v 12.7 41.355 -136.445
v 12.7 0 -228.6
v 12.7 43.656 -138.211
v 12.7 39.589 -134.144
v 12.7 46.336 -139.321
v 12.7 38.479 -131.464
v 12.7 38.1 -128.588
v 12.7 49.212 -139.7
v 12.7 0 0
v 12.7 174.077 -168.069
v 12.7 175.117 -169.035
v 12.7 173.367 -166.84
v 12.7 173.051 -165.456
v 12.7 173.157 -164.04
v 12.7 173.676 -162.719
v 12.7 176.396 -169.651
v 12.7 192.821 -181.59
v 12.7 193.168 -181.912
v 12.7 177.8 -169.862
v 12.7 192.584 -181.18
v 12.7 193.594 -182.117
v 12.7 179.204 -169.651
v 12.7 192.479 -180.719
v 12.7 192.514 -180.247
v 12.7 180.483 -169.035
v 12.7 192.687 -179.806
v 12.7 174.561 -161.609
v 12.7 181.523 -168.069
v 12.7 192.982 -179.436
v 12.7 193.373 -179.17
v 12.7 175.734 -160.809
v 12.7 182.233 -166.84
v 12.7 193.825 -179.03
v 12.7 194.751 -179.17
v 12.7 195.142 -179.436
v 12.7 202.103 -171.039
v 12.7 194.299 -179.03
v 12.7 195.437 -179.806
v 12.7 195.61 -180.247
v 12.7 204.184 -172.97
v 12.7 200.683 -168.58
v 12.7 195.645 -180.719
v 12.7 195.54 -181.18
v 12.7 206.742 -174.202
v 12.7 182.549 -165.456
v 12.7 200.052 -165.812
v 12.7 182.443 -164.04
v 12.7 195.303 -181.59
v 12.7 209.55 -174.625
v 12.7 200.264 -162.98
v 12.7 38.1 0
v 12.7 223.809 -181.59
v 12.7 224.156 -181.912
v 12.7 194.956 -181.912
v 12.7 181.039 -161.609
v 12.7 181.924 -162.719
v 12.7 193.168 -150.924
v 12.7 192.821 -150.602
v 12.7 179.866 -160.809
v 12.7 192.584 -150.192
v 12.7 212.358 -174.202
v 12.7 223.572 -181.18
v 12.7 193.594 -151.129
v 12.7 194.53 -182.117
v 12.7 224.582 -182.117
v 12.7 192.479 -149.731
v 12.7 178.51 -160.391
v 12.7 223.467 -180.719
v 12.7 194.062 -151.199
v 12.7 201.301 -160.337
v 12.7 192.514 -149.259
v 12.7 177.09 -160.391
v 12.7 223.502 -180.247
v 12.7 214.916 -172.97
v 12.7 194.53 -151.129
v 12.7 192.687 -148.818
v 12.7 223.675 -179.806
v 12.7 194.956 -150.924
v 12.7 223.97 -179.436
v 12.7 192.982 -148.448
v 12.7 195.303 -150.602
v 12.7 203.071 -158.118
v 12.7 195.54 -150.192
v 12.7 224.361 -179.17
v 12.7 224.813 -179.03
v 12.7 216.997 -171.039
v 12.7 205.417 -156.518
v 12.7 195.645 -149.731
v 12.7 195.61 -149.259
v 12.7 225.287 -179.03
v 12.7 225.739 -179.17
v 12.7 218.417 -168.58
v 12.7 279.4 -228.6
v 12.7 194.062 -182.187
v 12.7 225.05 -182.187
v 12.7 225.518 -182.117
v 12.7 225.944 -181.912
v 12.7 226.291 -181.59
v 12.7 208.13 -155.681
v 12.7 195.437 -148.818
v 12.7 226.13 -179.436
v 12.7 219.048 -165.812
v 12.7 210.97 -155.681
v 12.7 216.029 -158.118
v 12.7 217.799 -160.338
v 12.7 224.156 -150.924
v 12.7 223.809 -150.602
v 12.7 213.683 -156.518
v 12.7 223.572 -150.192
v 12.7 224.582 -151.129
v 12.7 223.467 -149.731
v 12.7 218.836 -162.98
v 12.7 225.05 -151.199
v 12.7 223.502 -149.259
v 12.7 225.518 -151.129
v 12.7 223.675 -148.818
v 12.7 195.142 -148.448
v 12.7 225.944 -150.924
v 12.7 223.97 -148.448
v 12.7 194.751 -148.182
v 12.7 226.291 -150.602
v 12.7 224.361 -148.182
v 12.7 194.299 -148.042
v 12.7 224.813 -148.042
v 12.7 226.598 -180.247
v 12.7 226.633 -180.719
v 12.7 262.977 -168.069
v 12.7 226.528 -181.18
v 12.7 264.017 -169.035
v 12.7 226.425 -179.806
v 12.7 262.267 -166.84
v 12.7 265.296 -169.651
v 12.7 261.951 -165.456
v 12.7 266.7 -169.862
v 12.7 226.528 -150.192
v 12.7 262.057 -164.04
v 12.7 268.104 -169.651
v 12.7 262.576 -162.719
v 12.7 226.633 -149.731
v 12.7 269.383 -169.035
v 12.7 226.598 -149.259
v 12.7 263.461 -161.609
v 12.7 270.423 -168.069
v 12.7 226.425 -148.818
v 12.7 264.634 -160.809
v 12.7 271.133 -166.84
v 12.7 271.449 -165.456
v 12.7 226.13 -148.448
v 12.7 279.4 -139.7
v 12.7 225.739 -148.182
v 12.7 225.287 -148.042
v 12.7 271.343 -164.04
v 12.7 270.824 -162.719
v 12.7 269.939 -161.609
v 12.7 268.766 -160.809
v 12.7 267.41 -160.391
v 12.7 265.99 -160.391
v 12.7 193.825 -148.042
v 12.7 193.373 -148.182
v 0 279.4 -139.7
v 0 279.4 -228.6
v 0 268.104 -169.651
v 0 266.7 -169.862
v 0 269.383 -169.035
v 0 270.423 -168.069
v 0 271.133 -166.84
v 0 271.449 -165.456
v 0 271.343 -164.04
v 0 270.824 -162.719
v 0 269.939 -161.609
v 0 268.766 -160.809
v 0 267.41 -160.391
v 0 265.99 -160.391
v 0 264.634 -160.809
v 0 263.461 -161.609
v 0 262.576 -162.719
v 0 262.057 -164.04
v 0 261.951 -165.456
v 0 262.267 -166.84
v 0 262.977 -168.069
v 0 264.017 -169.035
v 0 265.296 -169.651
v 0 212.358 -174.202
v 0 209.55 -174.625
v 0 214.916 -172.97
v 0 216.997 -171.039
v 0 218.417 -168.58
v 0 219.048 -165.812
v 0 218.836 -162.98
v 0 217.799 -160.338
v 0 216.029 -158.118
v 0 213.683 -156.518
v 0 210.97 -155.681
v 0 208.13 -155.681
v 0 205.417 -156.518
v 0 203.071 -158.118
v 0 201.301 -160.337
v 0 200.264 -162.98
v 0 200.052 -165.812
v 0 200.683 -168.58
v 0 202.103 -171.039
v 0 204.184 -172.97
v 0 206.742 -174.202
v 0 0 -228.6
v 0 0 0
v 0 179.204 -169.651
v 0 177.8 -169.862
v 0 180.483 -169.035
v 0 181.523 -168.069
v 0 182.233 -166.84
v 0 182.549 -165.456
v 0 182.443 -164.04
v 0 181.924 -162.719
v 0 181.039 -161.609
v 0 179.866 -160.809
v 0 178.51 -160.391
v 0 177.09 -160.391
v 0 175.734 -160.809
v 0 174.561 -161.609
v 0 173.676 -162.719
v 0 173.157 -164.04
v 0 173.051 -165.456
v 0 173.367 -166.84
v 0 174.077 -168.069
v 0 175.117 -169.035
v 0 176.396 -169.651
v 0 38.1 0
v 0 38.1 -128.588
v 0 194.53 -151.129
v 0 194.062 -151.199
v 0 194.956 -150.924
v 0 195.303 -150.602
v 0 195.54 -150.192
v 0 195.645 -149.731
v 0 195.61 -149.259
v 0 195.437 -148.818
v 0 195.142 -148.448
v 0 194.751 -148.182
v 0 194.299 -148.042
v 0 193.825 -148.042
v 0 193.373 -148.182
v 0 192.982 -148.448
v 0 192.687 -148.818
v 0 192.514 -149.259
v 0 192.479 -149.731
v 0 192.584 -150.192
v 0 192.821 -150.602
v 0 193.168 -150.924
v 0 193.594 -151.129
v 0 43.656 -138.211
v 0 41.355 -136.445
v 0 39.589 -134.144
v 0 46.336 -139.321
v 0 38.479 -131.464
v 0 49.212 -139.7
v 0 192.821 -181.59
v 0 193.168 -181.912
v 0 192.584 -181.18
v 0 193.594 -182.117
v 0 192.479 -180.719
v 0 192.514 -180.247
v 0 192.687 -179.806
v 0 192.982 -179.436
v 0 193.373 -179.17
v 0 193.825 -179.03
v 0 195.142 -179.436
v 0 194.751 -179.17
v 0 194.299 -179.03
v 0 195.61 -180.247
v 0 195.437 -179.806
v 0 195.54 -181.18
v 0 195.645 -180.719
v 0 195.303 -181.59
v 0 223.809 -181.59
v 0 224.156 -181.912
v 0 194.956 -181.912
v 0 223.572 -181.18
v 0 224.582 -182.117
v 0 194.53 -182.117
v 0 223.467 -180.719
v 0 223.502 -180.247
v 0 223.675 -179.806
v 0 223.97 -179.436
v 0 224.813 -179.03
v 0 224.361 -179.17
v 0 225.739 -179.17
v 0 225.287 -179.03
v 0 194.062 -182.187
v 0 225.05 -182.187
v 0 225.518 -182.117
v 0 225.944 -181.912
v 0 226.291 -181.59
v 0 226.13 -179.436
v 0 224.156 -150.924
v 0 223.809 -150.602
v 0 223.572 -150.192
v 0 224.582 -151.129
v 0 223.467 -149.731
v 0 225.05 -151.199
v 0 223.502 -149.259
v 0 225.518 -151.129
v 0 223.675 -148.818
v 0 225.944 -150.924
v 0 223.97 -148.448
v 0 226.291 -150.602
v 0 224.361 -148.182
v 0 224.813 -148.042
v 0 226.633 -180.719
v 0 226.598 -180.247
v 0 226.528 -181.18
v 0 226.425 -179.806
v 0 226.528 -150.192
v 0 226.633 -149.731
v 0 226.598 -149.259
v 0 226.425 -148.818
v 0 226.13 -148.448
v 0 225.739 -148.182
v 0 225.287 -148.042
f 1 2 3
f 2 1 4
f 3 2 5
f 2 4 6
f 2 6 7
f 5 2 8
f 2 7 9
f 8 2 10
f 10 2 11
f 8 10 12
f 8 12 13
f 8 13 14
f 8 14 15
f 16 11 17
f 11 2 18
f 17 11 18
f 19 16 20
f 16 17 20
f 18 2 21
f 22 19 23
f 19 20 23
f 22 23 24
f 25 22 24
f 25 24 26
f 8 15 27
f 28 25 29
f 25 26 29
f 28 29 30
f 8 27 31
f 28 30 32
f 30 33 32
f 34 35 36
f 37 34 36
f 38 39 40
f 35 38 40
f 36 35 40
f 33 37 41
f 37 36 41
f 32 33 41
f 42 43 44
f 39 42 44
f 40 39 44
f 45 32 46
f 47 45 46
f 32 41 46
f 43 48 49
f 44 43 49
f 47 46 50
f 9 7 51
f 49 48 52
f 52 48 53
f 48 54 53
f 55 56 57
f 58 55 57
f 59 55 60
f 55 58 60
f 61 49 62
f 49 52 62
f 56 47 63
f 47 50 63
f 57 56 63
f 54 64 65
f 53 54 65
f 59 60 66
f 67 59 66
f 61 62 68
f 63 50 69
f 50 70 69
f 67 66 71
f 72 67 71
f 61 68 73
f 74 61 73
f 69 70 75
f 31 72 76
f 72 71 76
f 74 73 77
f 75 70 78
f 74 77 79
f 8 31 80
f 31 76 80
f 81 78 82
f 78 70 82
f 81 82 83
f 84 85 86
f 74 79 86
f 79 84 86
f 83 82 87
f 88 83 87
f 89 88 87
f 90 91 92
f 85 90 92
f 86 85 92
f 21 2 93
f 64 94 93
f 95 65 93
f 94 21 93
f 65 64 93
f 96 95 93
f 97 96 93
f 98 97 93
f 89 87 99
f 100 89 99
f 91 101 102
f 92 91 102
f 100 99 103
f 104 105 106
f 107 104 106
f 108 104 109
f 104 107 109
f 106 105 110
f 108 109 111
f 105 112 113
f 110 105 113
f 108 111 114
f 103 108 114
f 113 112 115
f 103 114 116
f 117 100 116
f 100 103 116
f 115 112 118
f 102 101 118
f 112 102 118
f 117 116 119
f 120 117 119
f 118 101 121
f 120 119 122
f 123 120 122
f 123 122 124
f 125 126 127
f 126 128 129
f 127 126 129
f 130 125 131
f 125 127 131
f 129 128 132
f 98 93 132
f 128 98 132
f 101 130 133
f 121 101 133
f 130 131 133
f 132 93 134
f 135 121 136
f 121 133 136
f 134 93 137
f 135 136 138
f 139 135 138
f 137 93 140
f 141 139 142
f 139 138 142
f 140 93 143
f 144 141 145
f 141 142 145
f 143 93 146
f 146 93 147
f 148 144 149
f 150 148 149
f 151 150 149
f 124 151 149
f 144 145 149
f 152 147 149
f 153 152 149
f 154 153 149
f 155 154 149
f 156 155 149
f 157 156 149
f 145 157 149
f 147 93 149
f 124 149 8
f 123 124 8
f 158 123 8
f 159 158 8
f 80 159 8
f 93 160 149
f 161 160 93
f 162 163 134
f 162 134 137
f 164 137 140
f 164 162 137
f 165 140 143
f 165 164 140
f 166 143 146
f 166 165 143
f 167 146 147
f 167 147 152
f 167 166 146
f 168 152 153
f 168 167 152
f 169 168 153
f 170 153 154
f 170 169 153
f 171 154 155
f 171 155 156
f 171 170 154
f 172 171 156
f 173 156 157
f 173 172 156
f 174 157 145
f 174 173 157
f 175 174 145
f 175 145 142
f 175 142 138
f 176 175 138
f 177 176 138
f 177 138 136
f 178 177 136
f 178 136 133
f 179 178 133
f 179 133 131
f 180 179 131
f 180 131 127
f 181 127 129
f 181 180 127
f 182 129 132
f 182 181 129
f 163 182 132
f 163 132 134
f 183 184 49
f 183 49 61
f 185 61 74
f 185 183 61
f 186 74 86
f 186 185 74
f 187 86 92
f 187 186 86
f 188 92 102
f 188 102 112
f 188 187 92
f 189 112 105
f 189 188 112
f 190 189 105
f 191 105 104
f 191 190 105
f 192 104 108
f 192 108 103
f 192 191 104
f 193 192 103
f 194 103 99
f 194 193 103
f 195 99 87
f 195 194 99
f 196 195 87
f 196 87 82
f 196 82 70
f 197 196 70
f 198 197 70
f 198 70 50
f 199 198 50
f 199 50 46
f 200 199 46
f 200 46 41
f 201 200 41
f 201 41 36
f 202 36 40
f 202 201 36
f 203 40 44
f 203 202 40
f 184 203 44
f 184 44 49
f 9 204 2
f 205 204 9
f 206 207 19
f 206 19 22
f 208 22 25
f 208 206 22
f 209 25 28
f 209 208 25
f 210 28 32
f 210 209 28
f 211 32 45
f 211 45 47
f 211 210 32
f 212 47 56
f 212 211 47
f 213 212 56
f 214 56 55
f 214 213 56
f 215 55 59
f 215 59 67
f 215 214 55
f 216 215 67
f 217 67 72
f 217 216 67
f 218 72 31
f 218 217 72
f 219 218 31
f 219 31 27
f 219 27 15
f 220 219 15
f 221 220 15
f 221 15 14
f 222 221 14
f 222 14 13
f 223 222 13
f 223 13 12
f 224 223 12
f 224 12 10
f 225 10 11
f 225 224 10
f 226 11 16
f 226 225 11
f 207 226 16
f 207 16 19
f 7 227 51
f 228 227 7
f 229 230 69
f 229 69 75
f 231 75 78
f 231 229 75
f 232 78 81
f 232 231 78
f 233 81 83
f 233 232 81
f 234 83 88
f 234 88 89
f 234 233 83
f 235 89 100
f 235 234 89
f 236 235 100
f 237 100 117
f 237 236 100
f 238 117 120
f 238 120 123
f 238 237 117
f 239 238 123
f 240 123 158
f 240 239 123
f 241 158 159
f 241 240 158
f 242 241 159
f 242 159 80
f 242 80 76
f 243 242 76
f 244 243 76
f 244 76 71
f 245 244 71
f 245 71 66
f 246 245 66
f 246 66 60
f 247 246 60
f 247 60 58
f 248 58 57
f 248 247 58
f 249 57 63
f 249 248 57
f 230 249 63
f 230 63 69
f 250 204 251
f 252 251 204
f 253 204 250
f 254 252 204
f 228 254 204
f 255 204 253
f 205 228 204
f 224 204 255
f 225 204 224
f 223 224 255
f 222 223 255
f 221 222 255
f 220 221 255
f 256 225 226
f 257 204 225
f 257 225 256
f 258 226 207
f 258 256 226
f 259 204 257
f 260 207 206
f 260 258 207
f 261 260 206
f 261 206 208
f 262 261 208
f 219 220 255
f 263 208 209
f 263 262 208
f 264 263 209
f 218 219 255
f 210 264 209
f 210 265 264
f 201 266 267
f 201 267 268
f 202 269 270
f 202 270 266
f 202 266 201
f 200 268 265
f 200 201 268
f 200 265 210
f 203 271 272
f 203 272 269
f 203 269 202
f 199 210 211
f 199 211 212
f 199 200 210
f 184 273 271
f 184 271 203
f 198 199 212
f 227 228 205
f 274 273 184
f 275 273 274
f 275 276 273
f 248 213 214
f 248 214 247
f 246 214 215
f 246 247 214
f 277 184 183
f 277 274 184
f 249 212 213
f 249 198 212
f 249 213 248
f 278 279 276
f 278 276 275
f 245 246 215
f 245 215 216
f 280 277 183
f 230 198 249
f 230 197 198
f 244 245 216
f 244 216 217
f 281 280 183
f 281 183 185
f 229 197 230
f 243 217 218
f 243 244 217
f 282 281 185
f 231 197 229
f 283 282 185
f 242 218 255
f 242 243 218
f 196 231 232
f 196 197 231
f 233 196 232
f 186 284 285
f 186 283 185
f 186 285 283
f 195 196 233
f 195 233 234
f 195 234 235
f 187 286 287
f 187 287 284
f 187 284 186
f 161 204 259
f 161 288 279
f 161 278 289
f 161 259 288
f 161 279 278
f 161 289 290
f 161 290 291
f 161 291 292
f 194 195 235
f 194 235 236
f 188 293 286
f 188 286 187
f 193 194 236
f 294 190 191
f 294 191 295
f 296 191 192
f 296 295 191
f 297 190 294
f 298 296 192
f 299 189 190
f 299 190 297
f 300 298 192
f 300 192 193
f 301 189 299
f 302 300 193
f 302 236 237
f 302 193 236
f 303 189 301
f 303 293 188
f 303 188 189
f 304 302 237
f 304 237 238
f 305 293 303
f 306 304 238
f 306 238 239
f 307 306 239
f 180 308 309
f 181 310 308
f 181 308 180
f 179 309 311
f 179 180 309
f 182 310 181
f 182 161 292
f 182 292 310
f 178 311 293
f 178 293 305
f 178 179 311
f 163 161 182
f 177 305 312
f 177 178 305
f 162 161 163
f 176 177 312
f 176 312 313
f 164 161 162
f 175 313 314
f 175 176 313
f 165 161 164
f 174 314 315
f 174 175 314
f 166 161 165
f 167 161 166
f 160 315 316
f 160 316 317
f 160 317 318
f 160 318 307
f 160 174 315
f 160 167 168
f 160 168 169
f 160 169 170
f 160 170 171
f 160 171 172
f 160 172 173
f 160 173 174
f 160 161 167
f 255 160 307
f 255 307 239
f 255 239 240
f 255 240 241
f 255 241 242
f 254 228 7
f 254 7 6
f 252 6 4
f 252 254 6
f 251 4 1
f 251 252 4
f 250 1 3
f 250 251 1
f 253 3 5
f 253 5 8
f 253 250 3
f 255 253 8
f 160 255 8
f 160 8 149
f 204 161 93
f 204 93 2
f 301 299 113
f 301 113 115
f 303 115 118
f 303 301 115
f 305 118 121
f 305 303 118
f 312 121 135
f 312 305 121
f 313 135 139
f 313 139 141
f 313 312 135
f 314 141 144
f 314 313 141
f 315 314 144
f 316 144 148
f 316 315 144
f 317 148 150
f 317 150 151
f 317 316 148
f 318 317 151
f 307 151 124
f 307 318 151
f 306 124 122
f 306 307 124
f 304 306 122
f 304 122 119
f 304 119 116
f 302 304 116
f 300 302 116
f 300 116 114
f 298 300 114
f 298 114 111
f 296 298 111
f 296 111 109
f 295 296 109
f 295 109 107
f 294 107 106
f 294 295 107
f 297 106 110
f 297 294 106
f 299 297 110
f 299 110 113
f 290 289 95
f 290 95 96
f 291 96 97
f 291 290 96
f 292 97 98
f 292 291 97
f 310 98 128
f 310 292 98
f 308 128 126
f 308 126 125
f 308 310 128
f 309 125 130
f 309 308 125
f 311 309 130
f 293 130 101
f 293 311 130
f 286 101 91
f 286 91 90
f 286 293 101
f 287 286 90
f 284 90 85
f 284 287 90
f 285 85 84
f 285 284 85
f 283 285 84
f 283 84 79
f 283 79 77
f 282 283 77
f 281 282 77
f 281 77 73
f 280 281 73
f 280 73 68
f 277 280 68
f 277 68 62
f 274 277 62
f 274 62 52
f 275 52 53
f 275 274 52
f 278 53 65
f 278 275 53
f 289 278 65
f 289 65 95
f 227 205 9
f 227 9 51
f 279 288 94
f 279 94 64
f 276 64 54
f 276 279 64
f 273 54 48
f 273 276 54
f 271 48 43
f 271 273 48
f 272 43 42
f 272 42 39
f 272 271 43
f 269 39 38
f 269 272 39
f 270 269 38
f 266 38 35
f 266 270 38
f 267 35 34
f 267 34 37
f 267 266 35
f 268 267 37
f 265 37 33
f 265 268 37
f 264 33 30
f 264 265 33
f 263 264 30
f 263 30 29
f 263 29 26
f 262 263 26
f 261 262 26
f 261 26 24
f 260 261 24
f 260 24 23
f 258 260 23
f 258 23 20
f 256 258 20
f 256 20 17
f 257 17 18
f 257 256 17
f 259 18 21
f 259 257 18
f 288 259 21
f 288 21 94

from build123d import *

# Parameters (mm, degrees)
SKETCH1_R           = 4.7625
SKETCH1_R_2         = 9.525
SKETCH1_R_3         = 1.5875
BOSS_EXTRUDE1_DEPTH = 12.7


with BuildPart() as part:
    # Sketch1 → Boss-Extrude1 (new body)
    with BuildSketch(Plane(origin=(0, 0, 0), x_dir=(0, 0, -1), z_dir=(1, 0, 0))):
        with BuildLine():
            Line((0, 0), (0, 38.1))
            Line((0, 38.1), (128.5875, 38.1))
            ThreePointArc((128.5875, 38.1), (136.445224106, 41.354775894), (139.7, 49.2125))
            Line((139.7, 49.2125), (139.7, 279.4))
            Line((139.7, 279.4), (228.6, 279.4))
            Line((228.6, 279.4), (228.6, 0))
            Line((228.6, 0), (0, 0))
        make_face()
        with Locations((165.1, 266.7)):
            Circle(SKETCH1_R, mode=Mode.SUBTRACT)
        with Locations((165.1, 177.8)):
            Circle(SKETCH1_R, mode=Mode.SUBTRACT)
        with Locations((165.1, 209.55)):
            Circle(SKETCH1_R_2, mode=Mode.SUBTRACT)
        with Locations((180.599999988, 225.049999988)):
            Circle(SKETCH1_R_3, mode=Mode.SUBTRACT)
        with Locations((149.611999988, 225.049999988)):
            Circle(SKETCH1_R_3, mode=Mode.SUBTRACT)
        with Locations((180.599999988, 194.061999988)):
            Circle(SKETCH1_R_3, mode=Mode.SUBTRACT)
        with Locations((149.611999988, 194.061999988)):
            Circle(SKETCH1_R_3, mode=Mode.SUBTRACT)
    extrude(amount=BOSS_EXTRUDE1_DEPTH)


solid = part.part
